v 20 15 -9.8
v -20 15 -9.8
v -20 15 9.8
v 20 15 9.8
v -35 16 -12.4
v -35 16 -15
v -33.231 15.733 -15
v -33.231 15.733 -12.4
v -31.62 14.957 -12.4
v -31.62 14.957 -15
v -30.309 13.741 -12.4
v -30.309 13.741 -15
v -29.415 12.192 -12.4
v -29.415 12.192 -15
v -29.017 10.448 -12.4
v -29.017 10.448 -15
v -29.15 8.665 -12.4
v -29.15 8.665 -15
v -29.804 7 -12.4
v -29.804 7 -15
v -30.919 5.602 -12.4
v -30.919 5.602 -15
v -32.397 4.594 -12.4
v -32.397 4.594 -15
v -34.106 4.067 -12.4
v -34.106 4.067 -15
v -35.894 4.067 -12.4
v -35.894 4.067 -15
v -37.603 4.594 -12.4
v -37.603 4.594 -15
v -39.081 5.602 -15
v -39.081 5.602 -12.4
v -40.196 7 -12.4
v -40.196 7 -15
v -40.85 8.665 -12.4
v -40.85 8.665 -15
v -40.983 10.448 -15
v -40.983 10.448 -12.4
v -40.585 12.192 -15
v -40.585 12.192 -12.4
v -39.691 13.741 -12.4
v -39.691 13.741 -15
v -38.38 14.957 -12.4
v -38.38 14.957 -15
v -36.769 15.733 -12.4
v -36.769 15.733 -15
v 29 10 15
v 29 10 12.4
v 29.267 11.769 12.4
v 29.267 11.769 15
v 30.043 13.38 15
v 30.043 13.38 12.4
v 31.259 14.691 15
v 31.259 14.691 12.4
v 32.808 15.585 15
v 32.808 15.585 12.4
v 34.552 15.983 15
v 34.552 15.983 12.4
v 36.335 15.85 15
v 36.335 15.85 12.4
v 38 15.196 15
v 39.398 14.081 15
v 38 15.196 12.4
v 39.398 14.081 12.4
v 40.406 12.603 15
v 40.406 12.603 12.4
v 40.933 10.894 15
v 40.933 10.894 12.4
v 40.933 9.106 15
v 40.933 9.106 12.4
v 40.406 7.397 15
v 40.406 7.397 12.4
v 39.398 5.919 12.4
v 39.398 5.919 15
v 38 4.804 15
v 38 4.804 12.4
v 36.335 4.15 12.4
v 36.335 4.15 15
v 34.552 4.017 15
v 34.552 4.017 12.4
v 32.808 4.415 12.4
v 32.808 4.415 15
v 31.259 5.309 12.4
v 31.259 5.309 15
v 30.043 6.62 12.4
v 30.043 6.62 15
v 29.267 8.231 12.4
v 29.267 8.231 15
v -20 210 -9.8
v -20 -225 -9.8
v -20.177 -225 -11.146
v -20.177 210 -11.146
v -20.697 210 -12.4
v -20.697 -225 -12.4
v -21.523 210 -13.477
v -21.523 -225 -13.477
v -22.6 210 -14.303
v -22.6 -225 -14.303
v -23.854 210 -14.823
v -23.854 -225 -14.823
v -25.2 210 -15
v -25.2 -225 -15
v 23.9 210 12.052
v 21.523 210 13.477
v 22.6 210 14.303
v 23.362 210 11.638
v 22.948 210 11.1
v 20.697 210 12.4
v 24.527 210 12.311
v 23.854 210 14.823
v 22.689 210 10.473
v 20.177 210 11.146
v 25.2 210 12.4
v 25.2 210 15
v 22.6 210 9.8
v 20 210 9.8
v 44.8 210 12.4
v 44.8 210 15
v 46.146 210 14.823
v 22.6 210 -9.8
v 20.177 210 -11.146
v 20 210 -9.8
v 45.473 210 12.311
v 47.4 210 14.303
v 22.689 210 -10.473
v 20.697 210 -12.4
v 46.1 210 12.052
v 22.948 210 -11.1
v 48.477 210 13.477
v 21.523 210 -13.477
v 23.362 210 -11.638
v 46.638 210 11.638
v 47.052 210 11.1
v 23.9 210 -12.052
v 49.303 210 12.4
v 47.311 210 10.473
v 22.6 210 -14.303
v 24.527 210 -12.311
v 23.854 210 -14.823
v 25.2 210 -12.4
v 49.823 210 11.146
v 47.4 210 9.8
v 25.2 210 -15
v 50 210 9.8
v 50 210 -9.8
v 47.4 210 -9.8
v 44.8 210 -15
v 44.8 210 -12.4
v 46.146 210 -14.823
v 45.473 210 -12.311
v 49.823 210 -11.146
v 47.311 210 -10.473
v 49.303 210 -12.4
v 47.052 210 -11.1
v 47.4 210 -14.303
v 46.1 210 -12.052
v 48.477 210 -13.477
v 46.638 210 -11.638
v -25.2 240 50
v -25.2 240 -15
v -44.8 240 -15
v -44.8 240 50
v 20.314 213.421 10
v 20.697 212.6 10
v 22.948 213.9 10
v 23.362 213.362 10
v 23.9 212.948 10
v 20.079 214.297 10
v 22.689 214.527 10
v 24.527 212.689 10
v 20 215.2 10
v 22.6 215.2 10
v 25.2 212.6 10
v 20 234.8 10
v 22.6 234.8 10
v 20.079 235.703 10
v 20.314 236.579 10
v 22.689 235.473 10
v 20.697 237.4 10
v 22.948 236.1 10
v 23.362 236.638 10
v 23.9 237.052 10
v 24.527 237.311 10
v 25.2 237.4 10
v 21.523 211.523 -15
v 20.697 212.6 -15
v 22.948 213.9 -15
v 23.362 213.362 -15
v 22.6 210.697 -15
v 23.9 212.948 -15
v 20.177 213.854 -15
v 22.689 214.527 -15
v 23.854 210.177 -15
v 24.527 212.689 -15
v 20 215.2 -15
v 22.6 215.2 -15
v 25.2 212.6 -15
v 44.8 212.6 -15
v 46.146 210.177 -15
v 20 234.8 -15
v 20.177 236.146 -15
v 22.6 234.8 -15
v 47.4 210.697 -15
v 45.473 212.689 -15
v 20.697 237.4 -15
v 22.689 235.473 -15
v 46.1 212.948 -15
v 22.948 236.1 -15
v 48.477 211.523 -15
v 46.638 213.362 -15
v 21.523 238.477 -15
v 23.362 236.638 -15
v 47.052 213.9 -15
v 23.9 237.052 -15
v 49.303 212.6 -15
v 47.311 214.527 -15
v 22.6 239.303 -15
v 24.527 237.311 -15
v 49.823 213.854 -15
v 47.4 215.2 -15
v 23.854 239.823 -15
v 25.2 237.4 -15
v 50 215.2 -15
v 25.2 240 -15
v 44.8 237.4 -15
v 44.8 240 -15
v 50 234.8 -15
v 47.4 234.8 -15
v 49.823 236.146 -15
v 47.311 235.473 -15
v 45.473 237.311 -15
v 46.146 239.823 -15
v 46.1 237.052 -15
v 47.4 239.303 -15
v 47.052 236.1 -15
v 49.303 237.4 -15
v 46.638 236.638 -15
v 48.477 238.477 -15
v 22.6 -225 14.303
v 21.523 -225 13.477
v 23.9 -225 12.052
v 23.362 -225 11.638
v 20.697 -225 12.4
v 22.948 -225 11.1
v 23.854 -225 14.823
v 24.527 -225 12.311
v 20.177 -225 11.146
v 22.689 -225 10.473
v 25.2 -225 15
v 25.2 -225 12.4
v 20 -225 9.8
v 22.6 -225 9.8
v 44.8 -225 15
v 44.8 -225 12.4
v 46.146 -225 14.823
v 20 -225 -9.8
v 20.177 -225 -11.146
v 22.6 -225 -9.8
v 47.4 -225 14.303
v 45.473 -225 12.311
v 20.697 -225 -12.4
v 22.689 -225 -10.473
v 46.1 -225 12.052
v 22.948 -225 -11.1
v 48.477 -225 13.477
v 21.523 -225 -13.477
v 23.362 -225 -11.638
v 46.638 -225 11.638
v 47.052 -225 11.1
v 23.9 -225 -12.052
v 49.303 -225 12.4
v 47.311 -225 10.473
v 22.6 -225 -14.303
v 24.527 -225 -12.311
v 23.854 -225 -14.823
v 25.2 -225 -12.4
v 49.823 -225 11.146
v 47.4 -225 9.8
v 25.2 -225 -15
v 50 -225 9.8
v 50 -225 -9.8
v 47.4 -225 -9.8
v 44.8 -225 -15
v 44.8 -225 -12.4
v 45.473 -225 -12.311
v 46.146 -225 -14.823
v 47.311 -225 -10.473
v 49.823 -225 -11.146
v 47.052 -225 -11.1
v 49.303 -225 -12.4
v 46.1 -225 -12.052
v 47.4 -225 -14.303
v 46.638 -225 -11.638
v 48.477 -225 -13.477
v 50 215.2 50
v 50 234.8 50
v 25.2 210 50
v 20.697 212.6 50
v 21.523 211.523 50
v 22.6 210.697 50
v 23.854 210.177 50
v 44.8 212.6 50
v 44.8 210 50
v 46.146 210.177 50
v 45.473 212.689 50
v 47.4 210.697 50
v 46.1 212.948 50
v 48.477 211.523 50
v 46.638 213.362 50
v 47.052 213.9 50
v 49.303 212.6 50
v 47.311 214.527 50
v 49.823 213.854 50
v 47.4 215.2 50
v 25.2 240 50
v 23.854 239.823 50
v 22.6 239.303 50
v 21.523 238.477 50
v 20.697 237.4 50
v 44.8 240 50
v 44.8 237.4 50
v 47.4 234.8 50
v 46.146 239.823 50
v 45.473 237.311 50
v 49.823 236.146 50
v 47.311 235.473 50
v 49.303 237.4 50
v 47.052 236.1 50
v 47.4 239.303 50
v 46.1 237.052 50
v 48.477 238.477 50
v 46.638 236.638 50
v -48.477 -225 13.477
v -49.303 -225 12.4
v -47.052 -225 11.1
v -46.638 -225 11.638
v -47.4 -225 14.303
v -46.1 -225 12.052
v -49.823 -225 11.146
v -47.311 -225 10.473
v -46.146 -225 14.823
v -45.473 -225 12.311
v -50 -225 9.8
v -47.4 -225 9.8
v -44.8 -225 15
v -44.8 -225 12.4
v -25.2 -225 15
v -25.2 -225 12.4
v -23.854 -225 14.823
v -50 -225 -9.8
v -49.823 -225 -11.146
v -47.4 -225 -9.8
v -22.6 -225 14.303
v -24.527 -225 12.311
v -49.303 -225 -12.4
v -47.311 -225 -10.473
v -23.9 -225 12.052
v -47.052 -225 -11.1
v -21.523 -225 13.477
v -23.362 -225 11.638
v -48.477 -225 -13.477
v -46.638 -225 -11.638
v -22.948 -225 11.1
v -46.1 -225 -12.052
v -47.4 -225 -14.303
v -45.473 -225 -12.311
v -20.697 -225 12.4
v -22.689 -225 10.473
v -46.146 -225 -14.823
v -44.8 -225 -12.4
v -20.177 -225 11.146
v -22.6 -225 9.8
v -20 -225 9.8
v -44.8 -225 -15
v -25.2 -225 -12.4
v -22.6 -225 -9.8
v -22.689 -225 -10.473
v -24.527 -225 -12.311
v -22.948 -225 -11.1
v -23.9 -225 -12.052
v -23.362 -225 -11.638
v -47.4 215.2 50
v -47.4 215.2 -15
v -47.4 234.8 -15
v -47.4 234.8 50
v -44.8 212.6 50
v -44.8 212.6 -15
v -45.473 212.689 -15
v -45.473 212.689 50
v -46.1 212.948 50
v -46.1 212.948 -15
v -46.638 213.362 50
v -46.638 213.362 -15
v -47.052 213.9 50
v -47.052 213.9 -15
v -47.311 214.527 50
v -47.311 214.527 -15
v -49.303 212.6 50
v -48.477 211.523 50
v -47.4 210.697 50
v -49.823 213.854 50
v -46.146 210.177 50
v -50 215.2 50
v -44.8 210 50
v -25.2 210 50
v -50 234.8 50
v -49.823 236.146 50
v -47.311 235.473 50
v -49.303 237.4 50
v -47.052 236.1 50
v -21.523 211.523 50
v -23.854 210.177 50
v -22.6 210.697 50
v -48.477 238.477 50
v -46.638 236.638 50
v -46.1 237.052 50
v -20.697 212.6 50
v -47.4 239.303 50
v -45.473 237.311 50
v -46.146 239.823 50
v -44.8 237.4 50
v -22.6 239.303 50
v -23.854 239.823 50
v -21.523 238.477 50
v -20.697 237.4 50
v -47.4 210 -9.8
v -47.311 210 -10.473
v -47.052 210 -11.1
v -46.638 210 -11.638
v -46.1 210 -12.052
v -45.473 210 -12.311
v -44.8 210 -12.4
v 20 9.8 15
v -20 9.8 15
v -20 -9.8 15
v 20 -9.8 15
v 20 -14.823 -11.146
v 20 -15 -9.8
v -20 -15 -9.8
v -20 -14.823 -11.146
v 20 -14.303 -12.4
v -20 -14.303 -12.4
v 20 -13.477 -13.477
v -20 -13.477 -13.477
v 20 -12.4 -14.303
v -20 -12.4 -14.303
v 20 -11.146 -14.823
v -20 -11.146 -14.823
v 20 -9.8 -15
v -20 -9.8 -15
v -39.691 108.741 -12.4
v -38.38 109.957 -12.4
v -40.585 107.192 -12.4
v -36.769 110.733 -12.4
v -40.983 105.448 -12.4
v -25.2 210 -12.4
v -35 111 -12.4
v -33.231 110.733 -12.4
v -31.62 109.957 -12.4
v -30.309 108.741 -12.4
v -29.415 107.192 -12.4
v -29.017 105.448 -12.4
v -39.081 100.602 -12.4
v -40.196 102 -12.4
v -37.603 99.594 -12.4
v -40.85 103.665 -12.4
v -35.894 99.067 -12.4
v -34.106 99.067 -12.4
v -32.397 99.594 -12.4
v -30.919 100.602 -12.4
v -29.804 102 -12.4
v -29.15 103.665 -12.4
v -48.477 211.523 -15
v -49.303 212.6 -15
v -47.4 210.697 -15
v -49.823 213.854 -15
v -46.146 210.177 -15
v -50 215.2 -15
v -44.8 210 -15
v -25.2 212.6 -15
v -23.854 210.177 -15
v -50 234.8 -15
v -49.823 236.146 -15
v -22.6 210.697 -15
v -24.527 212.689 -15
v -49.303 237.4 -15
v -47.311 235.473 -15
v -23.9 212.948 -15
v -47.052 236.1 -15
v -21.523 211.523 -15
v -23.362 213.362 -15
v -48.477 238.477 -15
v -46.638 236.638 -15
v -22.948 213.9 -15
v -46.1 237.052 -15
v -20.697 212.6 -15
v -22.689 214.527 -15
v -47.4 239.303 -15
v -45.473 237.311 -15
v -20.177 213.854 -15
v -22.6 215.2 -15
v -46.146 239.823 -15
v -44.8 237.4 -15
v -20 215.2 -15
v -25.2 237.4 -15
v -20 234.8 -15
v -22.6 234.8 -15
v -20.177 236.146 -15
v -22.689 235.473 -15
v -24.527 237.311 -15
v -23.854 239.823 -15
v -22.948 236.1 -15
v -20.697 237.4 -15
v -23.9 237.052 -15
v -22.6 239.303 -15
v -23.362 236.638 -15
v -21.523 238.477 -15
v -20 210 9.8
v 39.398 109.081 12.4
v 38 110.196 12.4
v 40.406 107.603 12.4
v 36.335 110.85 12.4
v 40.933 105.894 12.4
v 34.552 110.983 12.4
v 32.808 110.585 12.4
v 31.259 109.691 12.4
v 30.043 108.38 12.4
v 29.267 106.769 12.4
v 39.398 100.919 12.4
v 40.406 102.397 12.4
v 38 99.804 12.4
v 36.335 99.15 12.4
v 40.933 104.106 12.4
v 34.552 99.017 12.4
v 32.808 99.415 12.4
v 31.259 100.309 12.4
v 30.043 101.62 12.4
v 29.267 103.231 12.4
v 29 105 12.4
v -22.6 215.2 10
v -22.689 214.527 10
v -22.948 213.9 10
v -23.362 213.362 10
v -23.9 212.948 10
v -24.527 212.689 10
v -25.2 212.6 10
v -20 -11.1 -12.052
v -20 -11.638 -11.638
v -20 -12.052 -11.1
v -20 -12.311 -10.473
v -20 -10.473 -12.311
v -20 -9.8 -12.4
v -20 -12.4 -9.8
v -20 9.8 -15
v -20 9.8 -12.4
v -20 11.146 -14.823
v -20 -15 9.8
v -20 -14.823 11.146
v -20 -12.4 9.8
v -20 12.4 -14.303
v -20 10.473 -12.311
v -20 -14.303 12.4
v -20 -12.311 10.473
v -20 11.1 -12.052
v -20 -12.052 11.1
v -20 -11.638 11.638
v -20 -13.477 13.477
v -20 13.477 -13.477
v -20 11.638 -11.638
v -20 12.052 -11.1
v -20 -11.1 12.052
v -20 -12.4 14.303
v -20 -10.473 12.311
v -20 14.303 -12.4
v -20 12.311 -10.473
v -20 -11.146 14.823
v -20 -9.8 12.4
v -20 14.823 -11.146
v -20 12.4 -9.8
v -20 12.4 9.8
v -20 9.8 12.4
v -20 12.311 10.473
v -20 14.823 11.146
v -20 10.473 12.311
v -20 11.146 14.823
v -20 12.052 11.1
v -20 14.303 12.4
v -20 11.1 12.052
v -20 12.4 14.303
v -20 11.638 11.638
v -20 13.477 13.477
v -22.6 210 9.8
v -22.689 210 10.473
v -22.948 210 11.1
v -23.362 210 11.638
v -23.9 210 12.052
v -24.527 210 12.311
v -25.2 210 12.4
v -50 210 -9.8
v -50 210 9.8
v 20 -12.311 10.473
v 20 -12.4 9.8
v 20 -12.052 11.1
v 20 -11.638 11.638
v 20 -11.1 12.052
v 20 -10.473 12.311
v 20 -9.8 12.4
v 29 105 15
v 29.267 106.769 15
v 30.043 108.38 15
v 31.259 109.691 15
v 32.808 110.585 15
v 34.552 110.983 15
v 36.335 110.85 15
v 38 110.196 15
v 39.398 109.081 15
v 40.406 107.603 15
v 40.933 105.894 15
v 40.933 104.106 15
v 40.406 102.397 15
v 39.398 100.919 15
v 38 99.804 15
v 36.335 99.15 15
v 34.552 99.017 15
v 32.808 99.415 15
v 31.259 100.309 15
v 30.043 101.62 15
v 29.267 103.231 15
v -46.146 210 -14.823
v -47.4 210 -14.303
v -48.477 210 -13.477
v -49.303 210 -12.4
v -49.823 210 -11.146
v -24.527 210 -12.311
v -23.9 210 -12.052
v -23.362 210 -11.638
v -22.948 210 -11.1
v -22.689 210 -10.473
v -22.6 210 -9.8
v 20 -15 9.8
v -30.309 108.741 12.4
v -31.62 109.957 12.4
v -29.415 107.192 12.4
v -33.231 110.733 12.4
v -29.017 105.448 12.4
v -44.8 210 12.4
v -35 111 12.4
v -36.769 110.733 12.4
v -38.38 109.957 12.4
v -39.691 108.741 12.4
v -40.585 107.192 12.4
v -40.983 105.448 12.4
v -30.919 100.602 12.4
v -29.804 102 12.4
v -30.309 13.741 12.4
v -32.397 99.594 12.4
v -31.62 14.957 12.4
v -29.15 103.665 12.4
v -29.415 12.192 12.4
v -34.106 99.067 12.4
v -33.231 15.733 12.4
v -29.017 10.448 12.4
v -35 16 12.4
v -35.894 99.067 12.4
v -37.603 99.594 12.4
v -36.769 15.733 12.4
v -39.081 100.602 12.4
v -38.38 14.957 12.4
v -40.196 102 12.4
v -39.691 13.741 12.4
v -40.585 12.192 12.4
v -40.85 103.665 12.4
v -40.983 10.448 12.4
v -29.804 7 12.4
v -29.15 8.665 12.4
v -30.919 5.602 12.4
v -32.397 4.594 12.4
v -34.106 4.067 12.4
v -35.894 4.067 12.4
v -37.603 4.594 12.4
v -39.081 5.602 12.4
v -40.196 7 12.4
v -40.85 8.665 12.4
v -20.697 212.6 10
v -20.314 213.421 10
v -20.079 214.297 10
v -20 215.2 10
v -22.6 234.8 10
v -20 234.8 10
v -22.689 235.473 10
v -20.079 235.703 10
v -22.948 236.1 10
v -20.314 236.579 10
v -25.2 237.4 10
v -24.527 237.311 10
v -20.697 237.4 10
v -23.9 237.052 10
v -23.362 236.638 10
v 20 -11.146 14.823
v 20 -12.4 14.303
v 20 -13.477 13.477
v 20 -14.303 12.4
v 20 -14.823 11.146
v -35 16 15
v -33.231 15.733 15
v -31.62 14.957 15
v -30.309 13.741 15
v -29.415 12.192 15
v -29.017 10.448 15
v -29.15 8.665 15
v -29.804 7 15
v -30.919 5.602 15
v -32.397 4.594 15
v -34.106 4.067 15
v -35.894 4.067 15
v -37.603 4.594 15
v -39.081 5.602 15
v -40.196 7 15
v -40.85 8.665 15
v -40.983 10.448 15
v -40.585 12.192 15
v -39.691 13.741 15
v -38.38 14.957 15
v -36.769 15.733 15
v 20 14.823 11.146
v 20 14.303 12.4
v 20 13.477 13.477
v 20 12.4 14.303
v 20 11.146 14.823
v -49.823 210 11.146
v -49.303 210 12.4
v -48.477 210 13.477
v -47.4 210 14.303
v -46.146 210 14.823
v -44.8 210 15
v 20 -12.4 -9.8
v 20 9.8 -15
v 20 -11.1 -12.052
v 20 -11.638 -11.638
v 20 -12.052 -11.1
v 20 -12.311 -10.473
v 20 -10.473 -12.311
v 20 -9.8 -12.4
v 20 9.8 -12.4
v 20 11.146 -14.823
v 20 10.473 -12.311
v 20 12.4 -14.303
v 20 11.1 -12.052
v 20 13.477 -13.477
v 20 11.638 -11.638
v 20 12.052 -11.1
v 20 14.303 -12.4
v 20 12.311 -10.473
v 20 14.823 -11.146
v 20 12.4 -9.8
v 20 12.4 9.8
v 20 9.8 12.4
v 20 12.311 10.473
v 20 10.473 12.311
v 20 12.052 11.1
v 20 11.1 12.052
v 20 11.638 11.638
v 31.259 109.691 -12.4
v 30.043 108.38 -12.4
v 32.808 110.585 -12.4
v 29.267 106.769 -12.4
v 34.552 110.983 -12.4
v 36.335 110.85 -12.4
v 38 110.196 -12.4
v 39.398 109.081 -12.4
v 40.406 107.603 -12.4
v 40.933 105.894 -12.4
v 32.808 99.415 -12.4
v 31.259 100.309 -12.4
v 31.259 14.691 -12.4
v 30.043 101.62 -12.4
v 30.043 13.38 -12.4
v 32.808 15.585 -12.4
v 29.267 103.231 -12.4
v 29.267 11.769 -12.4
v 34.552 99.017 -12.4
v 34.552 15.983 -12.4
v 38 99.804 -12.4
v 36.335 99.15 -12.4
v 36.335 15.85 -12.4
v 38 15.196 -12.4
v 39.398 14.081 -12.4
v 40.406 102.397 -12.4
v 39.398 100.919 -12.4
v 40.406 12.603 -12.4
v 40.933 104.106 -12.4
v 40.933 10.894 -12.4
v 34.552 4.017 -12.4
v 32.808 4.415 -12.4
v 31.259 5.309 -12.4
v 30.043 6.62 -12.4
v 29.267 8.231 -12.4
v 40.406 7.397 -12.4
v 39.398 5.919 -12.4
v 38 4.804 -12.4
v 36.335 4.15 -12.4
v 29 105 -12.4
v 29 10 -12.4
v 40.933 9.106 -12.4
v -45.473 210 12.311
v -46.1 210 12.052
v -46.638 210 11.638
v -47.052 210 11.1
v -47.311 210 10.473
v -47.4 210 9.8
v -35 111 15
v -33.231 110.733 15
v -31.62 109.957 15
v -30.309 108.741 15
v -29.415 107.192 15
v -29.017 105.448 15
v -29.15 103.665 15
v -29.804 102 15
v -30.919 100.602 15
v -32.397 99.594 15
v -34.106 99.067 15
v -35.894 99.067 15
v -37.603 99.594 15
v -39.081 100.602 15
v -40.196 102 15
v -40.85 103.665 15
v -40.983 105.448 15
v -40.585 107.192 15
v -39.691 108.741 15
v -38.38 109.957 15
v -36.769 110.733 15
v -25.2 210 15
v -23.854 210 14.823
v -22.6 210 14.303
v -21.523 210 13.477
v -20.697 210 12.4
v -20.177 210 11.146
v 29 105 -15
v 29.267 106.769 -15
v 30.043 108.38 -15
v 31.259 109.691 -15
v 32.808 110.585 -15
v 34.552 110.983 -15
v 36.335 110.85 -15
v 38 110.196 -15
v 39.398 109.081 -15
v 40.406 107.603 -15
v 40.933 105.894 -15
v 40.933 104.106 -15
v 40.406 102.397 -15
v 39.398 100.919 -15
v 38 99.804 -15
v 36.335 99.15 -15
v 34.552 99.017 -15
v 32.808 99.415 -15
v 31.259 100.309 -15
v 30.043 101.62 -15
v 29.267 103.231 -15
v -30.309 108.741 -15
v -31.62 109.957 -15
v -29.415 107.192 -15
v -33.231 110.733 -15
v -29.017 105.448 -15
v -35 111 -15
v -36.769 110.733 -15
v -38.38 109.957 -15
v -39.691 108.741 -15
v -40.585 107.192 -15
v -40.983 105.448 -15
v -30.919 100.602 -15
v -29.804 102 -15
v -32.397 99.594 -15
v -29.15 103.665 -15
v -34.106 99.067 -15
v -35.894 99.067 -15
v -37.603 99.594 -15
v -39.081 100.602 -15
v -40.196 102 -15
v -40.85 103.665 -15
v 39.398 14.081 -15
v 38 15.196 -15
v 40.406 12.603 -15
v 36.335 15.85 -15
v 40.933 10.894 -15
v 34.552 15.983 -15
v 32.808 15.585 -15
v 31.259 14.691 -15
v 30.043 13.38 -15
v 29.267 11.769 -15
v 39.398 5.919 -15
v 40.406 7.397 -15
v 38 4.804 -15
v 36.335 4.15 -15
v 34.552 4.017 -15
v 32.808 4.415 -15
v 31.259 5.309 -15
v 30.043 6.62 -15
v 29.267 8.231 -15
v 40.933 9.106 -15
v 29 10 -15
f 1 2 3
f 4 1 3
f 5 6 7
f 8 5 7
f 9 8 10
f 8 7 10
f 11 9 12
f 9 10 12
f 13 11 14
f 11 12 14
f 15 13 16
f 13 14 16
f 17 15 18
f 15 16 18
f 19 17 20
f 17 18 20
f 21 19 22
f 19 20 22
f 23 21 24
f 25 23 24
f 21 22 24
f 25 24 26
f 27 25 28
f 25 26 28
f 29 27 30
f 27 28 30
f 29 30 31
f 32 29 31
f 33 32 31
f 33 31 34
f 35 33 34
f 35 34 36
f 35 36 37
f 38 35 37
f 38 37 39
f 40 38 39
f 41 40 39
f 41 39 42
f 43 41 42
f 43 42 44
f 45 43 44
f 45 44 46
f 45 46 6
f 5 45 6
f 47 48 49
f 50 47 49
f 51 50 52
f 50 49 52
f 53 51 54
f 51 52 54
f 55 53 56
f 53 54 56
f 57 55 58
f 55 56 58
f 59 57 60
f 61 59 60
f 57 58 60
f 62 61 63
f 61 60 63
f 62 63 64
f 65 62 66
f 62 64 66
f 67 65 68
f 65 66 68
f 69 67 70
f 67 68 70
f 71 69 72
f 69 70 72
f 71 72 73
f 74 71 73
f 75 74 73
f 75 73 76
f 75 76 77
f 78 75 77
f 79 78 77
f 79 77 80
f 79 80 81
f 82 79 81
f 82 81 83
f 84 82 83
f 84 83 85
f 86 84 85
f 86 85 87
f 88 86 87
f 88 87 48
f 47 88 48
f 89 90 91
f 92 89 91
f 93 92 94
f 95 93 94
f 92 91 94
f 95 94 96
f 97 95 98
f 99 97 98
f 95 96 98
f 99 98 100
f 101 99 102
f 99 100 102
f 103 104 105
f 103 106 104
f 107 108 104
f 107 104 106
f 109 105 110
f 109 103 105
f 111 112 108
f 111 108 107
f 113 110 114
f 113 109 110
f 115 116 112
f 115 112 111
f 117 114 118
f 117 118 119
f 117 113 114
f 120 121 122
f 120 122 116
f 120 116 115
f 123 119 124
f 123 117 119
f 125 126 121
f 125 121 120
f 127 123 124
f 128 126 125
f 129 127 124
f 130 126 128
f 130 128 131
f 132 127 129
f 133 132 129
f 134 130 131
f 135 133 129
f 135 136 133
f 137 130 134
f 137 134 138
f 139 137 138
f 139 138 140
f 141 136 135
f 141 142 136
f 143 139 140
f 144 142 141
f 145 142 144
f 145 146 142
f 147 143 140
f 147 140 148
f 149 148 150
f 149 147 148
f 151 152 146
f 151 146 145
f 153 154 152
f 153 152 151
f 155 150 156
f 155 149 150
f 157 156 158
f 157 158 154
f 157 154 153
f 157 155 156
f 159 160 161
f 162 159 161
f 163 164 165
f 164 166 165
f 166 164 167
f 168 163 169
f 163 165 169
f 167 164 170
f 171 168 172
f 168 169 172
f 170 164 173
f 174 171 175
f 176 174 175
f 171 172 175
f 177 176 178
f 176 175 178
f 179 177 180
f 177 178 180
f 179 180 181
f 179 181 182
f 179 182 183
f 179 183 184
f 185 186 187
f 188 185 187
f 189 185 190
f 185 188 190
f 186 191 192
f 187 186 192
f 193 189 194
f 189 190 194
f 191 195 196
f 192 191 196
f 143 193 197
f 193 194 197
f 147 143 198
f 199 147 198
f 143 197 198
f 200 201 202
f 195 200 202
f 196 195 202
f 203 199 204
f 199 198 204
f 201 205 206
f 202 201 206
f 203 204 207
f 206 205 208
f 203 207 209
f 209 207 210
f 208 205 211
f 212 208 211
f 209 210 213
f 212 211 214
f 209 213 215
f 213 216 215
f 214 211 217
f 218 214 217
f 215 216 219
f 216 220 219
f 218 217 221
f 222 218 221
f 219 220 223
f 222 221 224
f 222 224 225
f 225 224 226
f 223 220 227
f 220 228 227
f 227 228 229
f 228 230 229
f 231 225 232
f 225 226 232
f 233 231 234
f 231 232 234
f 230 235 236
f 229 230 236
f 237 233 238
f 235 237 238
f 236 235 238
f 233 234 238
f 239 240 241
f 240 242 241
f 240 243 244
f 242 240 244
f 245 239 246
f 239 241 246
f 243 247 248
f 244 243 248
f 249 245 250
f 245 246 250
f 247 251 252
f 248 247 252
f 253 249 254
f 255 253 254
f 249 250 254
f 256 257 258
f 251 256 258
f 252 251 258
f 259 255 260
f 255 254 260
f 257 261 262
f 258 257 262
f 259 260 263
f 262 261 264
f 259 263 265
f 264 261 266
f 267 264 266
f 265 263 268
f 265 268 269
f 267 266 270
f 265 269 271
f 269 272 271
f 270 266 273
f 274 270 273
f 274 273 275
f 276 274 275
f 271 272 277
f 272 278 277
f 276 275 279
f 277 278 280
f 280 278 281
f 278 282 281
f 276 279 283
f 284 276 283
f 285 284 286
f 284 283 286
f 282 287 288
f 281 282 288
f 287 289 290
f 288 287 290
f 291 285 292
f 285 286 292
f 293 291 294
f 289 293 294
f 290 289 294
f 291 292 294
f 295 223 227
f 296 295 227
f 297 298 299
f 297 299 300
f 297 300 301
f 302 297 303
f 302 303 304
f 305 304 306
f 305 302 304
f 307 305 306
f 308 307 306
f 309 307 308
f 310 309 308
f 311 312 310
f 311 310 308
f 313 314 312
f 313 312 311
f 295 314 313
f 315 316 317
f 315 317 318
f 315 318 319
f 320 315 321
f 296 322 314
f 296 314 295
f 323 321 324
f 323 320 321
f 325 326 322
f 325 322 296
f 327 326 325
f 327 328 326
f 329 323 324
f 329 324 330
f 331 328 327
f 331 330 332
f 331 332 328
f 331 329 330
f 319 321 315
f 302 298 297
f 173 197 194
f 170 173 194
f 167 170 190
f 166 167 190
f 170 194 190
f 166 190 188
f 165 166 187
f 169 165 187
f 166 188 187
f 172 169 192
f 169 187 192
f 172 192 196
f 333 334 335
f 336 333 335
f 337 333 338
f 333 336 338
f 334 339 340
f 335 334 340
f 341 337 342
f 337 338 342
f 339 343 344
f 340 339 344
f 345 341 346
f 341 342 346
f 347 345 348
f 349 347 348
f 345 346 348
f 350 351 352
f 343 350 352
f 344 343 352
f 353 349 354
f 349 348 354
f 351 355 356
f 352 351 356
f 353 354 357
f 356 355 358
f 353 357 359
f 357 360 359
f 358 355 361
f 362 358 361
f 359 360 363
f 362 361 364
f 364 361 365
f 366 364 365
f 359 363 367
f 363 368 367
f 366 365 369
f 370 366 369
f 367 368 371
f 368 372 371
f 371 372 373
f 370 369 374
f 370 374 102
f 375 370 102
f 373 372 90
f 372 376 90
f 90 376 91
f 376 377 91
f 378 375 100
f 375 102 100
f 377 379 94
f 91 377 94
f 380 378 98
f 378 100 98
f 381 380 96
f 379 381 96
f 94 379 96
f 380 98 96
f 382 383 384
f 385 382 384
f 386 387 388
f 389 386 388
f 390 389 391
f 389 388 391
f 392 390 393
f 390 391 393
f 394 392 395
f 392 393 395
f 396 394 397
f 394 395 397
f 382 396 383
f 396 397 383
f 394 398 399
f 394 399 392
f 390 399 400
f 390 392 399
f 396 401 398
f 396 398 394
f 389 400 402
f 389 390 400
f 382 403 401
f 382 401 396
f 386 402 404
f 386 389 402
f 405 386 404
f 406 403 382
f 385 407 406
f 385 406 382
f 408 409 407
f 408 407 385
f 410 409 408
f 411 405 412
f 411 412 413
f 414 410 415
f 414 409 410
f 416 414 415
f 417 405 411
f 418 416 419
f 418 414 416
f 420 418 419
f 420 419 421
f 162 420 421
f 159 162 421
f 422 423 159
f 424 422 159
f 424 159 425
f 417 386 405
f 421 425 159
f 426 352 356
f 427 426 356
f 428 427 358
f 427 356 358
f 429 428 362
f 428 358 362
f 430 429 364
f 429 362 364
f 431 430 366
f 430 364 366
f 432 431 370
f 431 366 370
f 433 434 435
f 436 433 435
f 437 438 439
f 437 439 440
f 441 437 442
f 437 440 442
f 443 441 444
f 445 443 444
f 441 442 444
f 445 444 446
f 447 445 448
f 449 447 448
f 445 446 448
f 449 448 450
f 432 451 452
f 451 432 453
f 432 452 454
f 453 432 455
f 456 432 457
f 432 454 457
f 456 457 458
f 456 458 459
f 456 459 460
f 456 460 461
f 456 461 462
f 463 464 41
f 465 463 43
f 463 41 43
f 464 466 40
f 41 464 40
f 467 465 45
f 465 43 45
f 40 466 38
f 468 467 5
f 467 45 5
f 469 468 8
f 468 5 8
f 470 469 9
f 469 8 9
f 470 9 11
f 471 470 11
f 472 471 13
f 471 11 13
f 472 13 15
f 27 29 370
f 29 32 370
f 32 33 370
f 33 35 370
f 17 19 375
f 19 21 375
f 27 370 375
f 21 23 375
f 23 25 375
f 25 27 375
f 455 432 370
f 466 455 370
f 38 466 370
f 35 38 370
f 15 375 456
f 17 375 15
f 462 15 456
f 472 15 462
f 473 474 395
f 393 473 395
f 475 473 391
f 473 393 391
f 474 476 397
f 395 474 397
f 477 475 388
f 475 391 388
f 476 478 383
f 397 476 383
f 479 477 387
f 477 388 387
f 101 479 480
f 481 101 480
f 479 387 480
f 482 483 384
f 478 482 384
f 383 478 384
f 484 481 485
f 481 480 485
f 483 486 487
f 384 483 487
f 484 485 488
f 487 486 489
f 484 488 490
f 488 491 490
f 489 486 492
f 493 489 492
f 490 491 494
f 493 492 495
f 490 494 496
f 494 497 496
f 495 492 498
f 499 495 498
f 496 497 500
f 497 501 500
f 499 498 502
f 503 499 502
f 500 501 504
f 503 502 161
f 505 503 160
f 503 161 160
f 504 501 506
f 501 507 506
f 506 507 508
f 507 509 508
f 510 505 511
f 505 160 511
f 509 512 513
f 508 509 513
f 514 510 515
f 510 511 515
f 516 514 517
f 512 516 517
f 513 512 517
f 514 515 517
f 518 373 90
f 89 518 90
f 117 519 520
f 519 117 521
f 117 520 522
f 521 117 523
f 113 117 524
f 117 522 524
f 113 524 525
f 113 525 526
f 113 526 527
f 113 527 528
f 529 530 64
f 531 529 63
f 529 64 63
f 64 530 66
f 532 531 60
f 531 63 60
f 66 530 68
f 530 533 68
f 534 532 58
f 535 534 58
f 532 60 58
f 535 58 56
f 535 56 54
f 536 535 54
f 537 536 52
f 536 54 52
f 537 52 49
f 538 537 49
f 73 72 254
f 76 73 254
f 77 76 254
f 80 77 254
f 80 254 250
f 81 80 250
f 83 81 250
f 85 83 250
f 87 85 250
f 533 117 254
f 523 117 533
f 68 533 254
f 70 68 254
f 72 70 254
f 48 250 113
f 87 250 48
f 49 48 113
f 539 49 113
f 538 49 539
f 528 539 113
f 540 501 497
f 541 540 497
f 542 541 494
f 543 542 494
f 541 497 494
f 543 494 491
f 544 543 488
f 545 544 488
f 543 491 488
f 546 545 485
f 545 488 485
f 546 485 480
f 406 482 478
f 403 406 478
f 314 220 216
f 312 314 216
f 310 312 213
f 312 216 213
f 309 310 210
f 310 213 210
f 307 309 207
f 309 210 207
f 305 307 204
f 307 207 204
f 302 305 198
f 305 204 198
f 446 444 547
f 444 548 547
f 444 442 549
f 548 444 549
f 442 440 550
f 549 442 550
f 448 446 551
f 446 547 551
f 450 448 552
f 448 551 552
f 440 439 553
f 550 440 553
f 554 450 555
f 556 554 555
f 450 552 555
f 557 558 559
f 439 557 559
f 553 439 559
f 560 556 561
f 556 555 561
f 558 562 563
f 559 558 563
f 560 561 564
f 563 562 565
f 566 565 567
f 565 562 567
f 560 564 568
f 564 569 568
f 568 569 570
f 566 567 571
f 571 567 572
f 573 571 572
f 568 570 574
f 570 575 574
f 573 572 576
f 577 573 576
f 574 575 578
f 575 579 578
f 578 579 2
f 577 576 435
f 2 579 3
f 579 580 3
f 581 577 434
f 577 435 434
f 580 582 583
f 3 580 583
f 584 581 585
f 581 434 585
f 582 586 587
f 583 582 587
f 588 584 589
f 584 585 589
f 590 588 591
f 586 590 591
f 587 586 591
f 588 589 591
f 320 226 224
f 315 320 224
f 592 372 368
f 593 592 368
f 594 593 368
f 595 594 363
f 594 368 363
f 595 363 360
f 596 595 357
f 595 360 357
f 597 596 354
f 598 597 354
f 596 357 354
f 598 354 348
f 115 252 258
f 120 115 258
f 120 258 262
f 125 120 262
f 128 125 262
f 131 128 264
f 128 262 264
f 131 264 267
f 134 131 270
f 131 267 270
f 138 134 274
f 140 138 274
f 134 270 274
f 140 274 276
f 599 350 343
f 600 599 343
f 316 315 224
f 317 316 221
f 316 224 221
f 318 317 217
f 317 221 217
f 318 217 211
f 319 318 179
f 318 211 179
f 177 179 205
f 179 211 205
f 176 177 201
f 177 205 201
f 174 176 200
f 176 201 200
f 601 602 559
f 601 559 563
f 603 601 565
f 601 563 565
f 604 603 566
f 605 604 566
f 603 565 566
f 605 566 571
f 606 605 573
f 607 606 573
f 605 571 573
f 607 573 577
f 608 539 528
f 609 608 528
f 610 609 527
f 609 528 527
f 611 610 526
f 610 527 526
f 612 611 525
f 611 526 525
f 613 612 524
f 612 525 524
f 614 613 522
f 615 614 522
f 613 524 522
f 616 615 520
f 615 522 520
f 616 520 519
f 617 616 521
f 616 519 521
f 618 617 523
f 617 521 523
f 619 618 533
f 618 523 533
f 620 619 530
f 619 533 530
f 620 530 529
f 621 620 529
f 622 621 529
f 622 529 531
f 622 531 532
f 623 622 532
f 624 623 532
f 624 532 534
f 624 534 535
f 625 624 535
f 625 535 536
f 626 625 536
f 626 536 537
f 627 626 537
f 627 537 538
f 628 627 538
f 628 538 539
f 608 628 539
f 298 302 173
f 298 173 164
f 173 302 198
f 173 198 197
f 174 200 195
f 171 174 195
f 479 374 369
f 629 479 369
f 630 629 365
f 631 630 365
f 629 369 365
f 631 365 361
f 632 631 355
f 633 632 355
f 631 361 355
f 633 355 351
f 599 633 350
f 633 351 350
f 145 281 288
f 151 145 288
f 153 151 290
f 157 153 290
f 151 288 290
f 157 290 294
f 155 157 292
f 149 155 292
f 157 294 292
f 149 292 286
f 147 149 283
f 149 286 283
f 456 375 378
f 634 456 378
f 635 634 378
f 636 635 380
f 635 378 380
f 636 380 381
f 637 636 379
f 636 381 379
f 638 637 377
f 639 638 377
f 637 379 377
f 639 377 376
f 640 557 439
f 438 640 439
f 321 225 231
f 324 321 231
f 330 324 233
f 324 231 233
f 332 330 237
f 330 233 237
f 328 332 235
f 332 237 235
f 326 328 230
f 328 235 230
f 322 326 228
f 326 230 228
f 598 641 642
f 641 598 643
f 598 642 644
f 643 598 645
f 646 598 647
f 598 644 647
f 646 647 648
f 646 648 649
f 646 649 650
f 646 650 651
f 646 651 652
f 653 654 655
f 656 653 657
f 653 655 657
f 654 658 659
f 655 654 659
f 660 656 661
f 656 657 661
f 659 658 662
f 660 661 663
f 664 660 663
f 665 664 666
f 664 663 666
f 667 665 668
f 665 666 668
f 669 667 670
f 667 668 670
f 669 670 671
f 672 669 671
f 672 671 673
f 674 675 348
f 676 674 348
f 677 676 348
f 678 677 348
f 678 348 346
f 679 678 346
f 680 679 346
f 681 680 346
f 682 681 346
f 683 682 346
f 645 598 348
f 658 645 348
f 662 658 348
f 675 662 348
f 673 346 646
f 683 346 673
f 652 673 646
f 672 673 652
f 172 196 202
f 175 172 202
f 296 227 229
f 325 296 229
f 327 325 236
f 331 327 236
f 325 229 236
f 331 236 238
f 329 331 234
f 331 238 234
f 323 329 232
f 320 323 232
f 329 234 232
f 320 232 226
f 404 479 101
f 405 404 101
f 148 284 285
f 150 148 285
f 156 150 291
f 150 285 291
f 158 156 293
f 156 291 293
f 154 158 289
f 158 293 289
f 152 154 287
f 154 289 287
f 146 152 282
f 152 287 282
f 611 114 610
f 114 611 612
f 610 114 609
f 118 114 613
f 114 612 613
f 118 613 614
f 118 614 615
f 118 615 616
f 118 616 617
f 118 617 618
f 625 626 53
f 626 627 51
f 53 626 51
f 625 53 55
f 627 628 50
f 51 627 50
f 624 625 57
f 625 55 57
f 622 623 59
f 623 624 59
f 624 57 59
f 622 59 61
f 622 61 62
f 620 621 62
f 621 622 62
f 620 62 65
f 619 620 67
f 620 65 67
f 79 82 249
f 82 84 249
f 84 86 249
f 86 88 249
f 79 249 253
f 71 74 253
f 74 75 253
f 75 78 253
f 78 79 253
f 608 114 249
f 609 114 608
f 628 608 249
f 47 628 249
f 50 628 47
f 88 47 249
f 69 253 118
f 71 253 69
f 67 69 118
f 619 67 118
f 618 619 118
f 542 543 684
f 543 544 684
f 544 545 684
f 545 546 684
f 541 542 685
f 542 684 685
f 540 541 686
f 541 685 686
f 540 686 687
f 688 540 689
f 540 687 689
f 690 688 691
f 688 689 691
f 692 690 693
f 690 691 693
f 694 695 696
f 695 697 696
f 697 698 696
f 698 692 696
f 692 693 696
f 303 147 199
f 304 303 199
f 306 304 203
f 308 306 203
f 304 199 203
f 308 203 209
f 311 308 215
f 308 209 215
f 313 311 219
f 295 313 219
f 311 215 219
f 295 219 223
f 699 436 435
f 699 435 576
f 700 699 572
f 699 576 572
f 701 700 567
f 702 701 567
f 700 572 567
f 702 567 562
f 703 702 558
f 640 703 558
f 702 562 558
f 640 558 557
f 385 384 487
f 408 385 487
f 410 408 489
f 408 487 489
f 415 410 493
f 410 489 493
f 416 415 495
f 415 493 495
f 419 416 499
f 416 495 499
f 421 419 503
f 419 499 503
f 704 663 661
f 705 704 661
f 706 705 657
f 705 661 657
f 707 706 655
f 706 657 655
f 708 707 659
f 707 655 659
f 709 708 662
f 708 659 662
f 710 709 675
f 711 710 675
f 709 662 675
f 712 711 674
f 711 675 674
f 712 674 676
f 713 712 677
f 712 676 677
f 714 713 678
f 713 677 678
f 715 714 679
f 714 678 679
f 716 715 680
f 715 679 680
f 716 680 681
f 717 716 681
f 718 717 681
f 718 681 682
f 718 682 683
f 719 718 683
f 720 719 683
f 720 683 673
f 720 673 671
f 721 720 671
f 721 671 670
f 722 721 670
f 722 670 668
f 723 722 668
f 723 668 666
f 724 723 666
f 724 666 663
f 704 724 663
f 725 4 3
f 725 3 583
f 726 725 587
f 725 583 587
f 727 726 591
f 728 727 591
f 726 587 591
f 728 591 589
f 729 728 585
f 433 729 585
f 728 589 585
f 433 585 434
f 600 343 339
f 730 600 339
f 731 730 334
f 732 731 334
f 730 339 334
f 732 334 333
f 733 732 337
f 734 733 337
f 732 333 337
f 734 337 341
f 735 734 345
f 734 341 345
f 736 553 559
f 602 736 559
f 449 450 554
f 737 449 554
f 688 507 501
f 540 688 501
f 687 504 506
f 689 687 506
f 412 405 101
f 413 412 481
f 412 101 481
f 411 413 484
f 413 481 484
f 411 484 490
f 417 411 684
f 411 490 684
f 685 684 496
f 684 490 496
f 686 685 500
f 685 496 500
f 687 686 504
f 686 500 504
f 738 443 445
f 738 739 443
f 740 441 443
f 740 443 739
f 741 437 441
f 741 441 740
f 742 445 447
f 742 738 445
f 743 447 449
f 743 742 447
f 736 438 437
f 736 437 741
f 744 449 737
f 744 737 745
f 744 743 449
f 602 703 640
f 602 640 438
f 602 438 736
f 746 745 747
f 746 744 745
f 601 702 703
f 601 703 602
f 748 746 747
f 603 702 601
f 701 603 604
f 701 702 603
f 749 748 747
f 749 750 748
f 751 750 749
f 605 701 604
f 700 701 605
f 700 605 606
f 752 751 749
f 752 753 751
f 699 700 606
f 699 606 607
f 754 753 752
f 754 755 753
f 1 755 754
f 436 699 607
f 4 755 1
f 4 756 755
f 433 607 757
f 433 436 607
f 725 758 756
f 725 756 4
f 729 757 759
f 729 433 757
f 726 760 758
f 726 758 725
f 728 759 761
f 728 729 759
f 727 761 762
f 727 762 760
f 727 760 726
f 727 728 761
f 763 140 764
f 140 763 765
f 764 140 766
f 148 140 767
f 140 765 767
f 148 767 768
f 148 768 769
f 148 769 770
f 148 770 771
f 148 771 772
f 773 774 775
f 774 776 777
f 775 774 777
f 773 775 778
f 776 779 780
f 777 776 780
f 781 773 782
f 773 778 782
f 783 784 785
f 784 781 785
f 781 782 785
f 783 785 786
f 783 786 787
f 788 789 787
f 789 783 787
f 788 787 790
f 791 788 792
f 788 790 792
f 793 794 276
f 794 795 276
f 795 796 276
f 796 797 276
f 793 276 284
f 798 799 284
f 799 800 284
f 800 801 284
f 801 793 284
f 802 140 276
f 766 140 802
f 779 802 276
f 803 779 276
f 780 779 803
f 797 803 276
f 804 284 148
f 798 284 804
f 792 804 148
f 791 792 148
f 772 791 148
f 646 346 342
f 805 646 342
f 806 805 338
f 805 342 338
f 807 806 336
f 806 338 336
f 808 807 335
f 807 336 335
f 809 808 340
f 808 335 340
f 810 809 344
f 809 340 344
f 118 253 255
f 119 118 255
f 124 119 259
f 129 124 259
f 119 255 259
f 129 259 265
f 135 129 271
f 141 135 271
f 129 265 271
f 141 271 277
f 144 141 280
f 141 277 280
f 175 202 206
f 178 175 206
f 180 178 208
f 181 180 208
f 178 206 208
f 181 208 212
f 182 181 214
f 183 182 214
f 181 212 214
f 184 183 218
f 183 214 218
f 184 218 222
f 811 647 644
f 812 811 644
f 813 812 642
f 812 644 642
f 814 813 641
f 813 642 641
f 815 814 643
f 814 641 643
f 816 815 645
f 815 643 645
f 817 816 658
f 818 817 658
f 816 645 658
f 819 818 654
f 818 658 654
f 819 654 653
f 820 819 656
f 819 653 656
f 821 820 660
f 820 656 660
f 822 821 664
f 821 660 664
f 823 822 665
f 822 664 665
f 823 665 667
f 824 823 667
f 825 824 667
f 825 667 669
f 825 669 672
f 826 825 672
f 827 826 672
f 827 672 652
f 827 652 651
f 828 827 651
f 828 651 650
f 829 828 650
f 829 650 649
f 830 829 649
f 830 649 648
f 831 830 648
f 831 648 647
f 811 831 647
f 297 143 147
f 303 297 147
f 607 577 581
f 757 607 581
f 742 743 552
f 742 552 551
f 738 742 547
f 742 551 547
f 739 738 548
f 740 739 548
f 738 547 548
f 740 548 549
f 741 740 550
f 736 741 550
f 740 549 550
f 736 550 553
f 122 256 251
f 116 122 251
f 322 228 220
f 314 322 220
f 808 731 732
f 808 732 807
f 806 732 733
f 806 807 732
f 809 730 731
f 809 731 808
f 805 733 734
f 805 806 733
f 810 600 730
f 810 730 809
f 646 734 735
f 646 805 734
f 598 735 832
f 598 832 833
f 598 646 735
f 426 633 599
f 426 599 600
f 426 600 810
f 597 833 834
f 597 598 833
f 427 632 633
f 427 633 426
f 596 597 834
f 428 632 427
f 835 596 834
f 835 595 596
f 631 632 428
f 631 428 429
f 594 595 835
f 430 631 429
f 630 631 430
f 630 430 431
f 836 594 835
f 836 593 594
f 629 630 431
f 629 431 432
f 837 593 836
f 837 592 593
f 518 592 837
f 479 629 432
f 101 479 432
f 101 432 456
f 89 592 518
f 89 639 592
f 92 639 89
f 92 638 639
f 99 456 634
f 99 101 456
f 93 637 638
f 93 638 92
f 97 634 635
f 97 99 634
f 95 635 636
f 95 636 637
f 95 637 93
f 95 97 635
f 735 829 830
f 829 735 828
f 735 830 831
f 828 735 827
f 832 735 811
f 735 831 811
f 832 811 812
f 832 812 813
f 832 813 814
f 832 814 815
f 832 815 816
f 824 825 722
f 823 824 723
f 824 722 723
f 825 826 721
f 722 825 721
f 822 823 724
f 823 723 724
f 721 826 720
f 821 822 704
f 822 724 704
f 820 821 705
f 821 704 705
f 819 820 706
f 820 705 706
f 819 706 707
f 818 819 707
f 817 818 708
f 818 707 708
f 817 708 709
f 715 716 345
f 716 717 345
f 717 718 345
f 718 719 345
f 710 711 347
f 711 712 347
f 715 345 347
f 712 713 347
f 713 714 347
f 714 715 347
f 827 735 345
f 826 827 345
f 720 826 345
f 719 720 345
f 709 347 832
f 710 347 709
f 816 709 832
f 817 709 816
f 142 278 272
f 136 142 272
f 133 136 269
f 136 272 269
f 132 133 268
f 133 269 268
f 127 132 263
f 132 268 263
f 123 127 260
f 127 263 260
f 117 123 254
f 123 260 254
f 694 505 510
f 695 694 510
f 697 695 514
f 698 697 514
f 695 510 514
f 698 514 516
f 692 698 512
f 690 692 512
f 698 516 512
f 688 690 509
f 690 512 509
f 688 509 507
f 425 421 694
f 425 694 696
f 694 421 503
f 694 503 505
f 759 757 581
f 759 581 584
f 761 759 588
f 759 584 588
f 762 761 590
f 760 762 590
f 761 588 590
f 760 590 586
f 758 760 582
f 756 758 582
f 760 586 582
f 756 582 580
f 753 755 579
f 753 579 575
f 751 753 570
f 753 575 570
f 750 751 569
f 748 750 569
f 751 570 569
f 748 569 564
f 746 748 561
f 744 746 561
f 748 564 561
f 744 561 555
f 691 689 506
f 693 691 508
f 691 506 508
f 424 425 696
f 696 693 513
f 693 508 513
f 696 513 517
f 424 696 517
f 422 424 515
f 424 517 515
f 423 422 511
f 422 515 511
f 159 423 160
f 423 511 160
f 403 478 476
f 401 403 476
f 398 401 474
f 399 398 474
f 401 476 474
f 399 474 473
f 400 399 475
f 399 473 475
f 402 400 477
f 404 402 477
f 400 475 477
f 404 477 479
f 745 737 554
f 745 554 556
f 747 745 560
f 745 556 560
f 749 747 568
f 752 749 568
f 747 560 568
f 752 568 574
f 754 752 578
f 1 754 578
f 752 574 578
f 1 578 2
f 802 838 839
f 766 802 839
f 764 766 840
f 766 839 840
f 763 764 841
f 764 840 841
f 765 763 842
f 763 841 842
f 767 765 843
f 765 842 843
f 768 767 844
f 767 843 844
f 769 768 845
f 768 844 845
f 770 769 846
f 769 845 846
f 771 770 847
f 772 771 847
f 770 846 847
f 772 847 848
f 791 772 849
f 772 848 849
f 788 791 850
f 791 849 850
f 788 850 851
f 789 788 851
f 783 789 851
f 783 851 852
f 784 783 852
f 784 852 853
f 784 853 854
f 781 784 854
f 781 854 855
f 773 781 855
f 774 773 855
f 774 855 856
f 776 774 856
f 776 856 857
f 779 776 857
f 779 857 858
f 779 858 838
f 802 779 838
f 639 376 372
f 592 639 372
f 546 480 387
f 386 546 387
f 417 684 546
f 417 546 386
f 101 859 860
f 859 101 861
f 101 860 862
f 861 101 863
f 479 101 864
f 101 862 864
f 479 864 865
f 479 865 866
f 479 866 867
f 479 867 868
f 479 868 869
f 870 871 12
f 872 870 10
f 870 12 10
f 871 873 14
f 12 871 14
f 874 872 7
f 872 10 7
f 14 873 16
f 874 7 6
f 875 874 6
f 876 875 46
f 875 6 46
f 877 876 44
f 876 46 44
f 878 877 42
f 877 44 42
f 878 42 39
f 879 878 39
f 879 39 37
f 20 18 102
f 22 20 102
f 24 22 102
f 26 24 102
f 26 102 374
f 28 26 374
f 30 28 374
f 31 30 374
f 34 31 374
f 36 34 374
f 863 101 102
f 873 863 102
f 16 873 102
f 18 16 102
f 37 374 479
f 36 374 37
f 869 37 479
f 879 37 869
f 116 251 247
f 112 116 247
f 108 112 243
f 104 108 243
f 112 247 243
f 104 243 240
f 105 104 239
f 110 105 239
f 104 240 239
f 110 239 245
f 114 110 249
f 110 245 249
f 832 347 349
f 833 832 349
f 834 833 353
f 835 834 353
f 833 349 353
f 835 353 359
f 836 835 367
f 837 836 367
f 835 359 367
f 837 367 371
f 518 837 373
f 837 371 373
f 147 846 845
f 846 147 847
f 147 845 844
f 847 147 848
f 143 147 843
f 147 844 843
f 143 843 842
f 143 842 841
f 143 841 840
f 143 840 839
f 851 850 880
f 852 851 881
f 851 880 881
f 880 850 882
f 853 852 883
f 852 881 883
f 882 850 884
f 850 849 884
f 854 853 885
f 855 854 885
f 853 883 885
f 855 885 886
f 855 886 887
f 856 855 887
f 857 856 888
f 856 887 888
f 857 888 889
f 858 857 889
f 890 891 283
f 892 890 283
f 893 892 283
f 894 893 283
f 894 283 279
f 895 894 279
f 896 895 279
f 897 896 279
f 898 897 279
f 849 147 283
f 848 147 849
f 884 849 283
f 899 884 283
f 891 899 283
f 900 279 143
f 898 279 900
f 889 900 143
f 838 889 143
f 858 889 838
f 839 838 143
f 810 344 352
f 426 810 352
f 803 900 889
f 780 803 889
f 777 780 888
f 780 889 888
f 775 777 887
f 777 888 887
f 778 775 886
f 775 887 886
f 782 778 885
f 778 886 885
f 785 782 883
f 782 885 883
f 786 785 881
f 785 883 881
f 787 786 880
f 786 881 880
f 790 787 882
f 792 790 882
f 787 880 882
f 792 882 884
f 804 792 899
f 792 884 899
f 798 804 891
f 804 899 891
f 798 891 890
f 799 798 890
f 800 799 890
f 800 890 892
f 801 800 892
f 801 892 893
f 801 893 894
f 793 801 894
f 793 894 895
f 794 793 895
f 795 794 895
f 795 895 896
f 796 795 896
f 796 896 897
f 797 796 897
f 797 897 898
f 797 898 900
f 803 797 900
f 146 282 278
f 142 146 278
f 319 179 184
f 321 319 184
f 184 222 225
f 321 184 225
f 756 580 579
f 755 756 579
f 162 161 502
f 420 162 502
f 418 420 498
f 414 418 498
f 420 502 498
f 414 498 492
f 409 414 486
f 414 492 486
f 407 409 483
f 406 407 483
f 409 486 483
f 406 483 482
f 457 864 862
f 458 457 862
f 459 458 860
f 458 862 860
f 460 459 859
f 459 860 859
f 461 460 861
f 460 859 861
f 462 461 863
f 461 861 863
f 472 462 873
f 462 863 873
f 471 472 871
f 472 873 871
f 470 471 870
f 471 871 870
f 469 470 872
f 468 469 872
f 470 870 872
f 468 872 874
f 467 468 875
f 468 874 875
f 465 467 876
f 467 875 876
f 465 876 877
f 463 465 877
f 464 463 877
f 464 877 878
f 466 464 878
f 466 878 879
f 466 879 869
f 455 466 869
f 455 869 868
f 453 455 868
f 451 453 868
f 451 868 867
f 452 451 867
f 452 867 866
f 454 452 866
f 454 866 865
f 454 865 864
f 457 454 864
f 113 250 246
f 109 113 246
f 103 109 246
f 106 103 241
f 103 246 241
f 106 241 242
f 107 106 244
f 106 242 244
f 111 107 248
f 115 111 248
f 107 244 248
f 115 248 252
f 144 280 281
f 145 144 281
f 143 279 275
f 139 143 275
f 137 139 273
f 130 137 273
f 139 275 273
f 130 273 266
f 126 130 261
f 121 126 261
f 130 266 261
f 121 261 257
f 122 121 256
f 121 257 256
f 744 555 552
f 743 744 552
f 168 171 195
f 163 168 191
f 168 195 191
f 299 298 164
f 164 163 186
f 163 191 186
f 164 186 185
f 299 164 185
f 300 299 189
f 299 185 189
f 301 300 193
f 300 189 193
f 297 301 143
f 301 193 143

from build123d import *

# Parameters (mm, degrees)
RURA_START                              = -15
RURA_KWADRATOWA_30_X_30_X_2_6_1_DEPTH   = 65
RURA_START_2                            = -225
RURA_KWADRATOWA_30_X_30_X_2_6_1_2_DEPTH = 435
RURA_START_3                            = -20
RURA_KWADRATOWA_30_X_30_X_2_6_1_3_DEPTH = 40
WYTNIJ_WYCI_GNI_CIE1_START              = -5.2
SZKIC3_W                                = 40
SZKIC3_H                                = 24.8
WYTNIJ_WYCI_GNI_CIE1_DEPTH              = 50.4
SZKIC4_R                                = 6
WYTNIJ_WYCI_GNI_CIE2_DEPTH              = 254.623737059


# Read off the part's stored shape, not the designer's step: Rura kwadratowa 30 X 30 X 2.6(1)
with BuildPart() as part:
    # Rura kwadratowa 30 X 30 X 2.6(1) outline → Rura kwadratowa 30 X 30 X 2.6(1) (new body)
    # profile 1 of 2: a face of its own
    with BuildSketch(Plane.XY.offset(RURA_START)):
        with BuildLine():
            Line((-44.8, 210), (-25.2, 210))
            ThreePointArc((-25.2, 210), (-21.523044738, 211.523044738), (-20, 215.2))
            Line((-20, 215.2), (-20, 234.8))
            ThreePointArc((-20, 234.8), (-21.523044738, 238.476955262), (-25.2, 240))
            Line((-25.2, 240), (-44.8, 240))
            ThreePointArc((-44.8, 240), (-48.476955262, 238.476955262), (-50, 234.8))
            Line((-50, 234.8), (-50, 215.2))
            ThreePointArc((-50, 215.2), (-48.476955262, 211.523044738), (-44.8, 210))
        make_face()
        with BuildLine():
            ThreePointArc((-44.8, 212.6), (-46.638477631, 213.361522369), (-47.4, 215.2))
            Line((-47.4, 215.2), (-47.4, 234.8))
            ThreePointArc((-47.4, 234.8), (-46.638477631, 236.638477631), (-44.8, 237.4))
            Line((-44.8, 237.4), (-25.2, 237.4))
            ThreePointArc((-25.2, 237.4), (-23.361522369, 236.638477631), (-22.6, 234.8))
            Line((-22.6, 234.8), (-22.6, 215.2))
            ThreePointArc((-22.6, 215.2), (-23.361522369, 213.361522369), (-25.2, 212.6))
            Line((-25.2, 212.6), (-44.8, 212.6))
        make_face(mode=Mode.SUBTRACT)
    # profile 2 of 2: a face of its own
    with BuildSketch(Plane.XY.offset(RURA_START)):
        with BuildLine():
            ThreePointArc((50, 234.8), (48.476955262, 238.476955262), (44.8, 240))
            Line((44.8, 240), (25.2, 240))
            ThreePointArc((25.2, 240), (21.523044738, 238.476955262), (20, 234.8))
            Line((20, 234.8), (20, 215.2))
            ThreePointArc((20, 215.2), (21.523044738, 211.523044738), (25.2, 210))
            Line((25.2, 210), (44.8, 210))
            ThreePointArc((44.8, 210), (48.476955262, 211.523044738), (50, 215.2))
            Line((50, 215.2), (50, 234.8))
        make_face()
        with BuildLine():
            Line((22.6, 215.2), (22.6, 234.8))
            ThreePointArc((22.6, 234.8), (23.361522369, 236.638477631), (25.2, 237.4))
            Line((25.2, 237.4), (44.8, 237.4))
            ThreePointArc((44.8, 237.4), (46.638477631, 236.638477631), (47.4, 234.8))
            Line((47.4, 234.8), (47.4, 215.2))
            ThreePointArc((47.4, 215.2), (46.638477631, 213.361522369), (44.8, 212.6))
            Line((44.8, 212.6), (25.2, 212.6))
            ThreePointArc((25.2, 212.6), (23.361522369, 213.361522369), (22.6, 215.2))
        make_face(mode=Mode.SUBTRACT)
    extrude(amount=RURA_KWADRATOWA_30_X_30_X_2_6_1_DEPTH)

    # Szkic3 → Wytnij-wyciągnięcie1 (cut)
    with BuildSketch(Plane.ZY.offset(-20).offset(WYTNIJ_WYCI_GNI_CIE1_START)):
        with Locations((30, 225)):
            Rectangle(SZKIC3_W, SZKIC3_H)
    extrude(amount=WYTNIJ_WYCI_GNI_CIE1_DEPTH, mode=Mode.SUBTRACT)


with BuildPart() as body_2:
    # Rura kwadratowa 30 X 30 X 2.6_1 2 outlin → Rura kwadratowa 30 X 30 X 2.6_1 2 (new body)
    # profile 1 of 2: a face of its own
    with BuildSketch(Plane(origin=(0, 0, 0), x_dir=(1, 0, 0), z_dir=(0, 1, 0)).offset(RURA_START_2)):
        with BuildLine():
            Line((-20, -9.8), (-20, 9.8))
            ThreePointArc((-20, 9.8), (-21.523044738, 13.476955262), (-25.2, 15))
            Line((-25.2, 15), (-44.8, 15))
            ThreePointArc((-44.8, 15), (-48.476955262, 13.476955262), (-50, 9.8))
            Line((-50, 9.8), (-50, -9.8))
            ThreePointArc((-50, -9.8), (-48.476955262, -13.476955262), (-44.8, -15))
            Line((-44.8, -15), (-25.2, -15))
            ThreePointArc((-25.2, -15), (-21.523044738, -13.476955262), (-20, -9.8))
        make_face()
        with BuildLine():
            ThreePointArc((-44.8, -12.4), (-46.638477631, -11.638477631), (-47.4, -9.8))
            Line((-47.4, -9.8), (-47.4, 9.8))
            ThreePointArc((-47.4, 9.8), (-46.638477631, 11.638477631), (-44.8, 12.4))
            Line((-44.8, 12.4), (-25.2, 12.4))
            ThreePointArc((-25.2, 12.4), (-23.361522369, 11.638477631), (-22.6, 9.8))
            Line((-22.6, 9.8), (-22.6, -9.8))
            ThreePointArc((-22.6, -9.8), (-23.361522369, -11.638477631), (-25.2, -12.4))
            Line((-25.2, -12.4), (-44.8, -12.4))
        make_face(mode=Mode.SUBTRACT)
    # profile 2 of 2: a face of its own
    with BuildSketch(Plane(origin=(0, 0, 0), x_dir=(1, 0, 0), z_dir=(0, 1, 0)).offset(RURA_START_2)):
        with BuildLine():
            ThreePointArc((50, 9.8), (48.476955262, 13.476955262), (44.8, 15))
            Line((44.8, 15), (25.2, 15))
            ThreePointArc((25.2, 15), (21.523044738, 13.476955262), (20, 9.8))
            Line((20, 9.8), (20, -9.8))
            ThreePointArc((20, -9.8), (21.523044738, -13.476955262), (25.2, -15))
            Line((25.2, -15), (44.8, -15))
            ThreePointArc((44.8, -15), (48.476955262, -13.476955262), (50, -9.8))
            Line((50, -9.8), (50, 9.8))
        make_face()
        with BuildLine():
            Line((22.6, -9.8), (22.6, 9.8))
            ThreePointArc((22.6, 9.8), (23.361522369, 11.638477631), (25.2, 12.4))
            Line((25.2, 12.4), (44.8, 12.4))
            ThreePointArc((44.8, 12.4), (46.638477631, 11.638477631), (47.4, 9.8))
            Line((47.4, 9.8), (47.4, -9.8))
            ThreePointArc((47.4, -9.8), (46.638477631, -11.638477631), (44.8, -12.4))
            Line((44.8, -12.4), (25.2, -12.4))
            ThreePointArc((25.2, -12.4), (23.361522369, -11.638477631), (22.6, -9.8))
        make_face(mode=Mode.SUBTRACT)
    extrude(amount=RURA_KWADRATOWA_30_X_30_X_2_6_1_2_DEPTH)

    # Szkic4 → Wytnij-wyciągnięcie2 (cut, through all)
    with BuildSketch(Plane(origin=(0, 0, -15), x_dir=(-1, 0, 0), z_dir=(0, 0, -1))):
        with Locations(Location((35, 105, 0), (0, 0, 90))):
            Circle(SZKIC4_R)
        with Locations(Location((35, 10, 0), (0, 0, 90))):
            Circle(SZKIC4_R)
        with Locations((-35, 105)):
            Circle(SZKIC4_R)
        with Locations((-35, 10)):
            Circle(SZKIC4_R)
    extrude(amount=-WYTNIJ_WYCI_GNI_CIE2_DEPTH, mode=Mode.SUBTRACT)


with BuildPart() as body_3:
    # Rura kwadratowa 30 X 30 X 2.6_1 3 outlin → Rura kwadratowa 30 X 30 X 2.6_1 3 (new body)
    with BuildSketch(Plane.YZ.offset(RURA_START_3)):
        with BuildLine():
            Line((-9.8, -15), (9.8, -15))
            ThreePointArc((9.8, -15), (13.476955262, -13.476955262), (15, -9.8))
            Line((15, -9.8), (15, 9.8))
            ThreePointArc((15, 9.8), (13.476955262, 13.476955262), (9.8, 15))
            Line((9.8, 15), (-9.8, 15))
            ThreePointArc((-9.8, 15), (-13.476955262, 13.476955262), (-15, 9.8))
            Line((-15, 9.8), (-15, -9.8))
            ThreePointArc((-15, -9.8), (-13.476955262, -13.476955262), (-9.8, -15))
        make_face()
        with BuildLine():
            ThreePointArc((-12.4, 9.8), (-11.638477631, 11.638477631), (-9.8, 12.4))
            Line((-9.8, 12.4), (9.8, 12.4))
            ThreePointArc((9.8, 12.4), (11.638477631, 11.638477631), (12.4, 9.8))
            Line((12.4, 9.8), (12.4, -9.8))
            ThreePointArc((12.4, -9.8), (11.638477631, -11.638477631), (9.8, -12.4))
            Line((9.8, -12.4), (-9.8, -12.4))
            ThreePointArc((-9.8, -12.4), (-11.638477631, -11.638477631), (-12.4, -9.8))
            Line((-12.4, -9.8), (-12.4, 9.8))
        make_face(mode=Mode.SUBTRACT)
    extrude(amount=RURA_KWADRATOWA_30_X_30_X_2_6_1_3_DEPTH)


solid = Compound([part.part, body_2.part, body_3.part])
